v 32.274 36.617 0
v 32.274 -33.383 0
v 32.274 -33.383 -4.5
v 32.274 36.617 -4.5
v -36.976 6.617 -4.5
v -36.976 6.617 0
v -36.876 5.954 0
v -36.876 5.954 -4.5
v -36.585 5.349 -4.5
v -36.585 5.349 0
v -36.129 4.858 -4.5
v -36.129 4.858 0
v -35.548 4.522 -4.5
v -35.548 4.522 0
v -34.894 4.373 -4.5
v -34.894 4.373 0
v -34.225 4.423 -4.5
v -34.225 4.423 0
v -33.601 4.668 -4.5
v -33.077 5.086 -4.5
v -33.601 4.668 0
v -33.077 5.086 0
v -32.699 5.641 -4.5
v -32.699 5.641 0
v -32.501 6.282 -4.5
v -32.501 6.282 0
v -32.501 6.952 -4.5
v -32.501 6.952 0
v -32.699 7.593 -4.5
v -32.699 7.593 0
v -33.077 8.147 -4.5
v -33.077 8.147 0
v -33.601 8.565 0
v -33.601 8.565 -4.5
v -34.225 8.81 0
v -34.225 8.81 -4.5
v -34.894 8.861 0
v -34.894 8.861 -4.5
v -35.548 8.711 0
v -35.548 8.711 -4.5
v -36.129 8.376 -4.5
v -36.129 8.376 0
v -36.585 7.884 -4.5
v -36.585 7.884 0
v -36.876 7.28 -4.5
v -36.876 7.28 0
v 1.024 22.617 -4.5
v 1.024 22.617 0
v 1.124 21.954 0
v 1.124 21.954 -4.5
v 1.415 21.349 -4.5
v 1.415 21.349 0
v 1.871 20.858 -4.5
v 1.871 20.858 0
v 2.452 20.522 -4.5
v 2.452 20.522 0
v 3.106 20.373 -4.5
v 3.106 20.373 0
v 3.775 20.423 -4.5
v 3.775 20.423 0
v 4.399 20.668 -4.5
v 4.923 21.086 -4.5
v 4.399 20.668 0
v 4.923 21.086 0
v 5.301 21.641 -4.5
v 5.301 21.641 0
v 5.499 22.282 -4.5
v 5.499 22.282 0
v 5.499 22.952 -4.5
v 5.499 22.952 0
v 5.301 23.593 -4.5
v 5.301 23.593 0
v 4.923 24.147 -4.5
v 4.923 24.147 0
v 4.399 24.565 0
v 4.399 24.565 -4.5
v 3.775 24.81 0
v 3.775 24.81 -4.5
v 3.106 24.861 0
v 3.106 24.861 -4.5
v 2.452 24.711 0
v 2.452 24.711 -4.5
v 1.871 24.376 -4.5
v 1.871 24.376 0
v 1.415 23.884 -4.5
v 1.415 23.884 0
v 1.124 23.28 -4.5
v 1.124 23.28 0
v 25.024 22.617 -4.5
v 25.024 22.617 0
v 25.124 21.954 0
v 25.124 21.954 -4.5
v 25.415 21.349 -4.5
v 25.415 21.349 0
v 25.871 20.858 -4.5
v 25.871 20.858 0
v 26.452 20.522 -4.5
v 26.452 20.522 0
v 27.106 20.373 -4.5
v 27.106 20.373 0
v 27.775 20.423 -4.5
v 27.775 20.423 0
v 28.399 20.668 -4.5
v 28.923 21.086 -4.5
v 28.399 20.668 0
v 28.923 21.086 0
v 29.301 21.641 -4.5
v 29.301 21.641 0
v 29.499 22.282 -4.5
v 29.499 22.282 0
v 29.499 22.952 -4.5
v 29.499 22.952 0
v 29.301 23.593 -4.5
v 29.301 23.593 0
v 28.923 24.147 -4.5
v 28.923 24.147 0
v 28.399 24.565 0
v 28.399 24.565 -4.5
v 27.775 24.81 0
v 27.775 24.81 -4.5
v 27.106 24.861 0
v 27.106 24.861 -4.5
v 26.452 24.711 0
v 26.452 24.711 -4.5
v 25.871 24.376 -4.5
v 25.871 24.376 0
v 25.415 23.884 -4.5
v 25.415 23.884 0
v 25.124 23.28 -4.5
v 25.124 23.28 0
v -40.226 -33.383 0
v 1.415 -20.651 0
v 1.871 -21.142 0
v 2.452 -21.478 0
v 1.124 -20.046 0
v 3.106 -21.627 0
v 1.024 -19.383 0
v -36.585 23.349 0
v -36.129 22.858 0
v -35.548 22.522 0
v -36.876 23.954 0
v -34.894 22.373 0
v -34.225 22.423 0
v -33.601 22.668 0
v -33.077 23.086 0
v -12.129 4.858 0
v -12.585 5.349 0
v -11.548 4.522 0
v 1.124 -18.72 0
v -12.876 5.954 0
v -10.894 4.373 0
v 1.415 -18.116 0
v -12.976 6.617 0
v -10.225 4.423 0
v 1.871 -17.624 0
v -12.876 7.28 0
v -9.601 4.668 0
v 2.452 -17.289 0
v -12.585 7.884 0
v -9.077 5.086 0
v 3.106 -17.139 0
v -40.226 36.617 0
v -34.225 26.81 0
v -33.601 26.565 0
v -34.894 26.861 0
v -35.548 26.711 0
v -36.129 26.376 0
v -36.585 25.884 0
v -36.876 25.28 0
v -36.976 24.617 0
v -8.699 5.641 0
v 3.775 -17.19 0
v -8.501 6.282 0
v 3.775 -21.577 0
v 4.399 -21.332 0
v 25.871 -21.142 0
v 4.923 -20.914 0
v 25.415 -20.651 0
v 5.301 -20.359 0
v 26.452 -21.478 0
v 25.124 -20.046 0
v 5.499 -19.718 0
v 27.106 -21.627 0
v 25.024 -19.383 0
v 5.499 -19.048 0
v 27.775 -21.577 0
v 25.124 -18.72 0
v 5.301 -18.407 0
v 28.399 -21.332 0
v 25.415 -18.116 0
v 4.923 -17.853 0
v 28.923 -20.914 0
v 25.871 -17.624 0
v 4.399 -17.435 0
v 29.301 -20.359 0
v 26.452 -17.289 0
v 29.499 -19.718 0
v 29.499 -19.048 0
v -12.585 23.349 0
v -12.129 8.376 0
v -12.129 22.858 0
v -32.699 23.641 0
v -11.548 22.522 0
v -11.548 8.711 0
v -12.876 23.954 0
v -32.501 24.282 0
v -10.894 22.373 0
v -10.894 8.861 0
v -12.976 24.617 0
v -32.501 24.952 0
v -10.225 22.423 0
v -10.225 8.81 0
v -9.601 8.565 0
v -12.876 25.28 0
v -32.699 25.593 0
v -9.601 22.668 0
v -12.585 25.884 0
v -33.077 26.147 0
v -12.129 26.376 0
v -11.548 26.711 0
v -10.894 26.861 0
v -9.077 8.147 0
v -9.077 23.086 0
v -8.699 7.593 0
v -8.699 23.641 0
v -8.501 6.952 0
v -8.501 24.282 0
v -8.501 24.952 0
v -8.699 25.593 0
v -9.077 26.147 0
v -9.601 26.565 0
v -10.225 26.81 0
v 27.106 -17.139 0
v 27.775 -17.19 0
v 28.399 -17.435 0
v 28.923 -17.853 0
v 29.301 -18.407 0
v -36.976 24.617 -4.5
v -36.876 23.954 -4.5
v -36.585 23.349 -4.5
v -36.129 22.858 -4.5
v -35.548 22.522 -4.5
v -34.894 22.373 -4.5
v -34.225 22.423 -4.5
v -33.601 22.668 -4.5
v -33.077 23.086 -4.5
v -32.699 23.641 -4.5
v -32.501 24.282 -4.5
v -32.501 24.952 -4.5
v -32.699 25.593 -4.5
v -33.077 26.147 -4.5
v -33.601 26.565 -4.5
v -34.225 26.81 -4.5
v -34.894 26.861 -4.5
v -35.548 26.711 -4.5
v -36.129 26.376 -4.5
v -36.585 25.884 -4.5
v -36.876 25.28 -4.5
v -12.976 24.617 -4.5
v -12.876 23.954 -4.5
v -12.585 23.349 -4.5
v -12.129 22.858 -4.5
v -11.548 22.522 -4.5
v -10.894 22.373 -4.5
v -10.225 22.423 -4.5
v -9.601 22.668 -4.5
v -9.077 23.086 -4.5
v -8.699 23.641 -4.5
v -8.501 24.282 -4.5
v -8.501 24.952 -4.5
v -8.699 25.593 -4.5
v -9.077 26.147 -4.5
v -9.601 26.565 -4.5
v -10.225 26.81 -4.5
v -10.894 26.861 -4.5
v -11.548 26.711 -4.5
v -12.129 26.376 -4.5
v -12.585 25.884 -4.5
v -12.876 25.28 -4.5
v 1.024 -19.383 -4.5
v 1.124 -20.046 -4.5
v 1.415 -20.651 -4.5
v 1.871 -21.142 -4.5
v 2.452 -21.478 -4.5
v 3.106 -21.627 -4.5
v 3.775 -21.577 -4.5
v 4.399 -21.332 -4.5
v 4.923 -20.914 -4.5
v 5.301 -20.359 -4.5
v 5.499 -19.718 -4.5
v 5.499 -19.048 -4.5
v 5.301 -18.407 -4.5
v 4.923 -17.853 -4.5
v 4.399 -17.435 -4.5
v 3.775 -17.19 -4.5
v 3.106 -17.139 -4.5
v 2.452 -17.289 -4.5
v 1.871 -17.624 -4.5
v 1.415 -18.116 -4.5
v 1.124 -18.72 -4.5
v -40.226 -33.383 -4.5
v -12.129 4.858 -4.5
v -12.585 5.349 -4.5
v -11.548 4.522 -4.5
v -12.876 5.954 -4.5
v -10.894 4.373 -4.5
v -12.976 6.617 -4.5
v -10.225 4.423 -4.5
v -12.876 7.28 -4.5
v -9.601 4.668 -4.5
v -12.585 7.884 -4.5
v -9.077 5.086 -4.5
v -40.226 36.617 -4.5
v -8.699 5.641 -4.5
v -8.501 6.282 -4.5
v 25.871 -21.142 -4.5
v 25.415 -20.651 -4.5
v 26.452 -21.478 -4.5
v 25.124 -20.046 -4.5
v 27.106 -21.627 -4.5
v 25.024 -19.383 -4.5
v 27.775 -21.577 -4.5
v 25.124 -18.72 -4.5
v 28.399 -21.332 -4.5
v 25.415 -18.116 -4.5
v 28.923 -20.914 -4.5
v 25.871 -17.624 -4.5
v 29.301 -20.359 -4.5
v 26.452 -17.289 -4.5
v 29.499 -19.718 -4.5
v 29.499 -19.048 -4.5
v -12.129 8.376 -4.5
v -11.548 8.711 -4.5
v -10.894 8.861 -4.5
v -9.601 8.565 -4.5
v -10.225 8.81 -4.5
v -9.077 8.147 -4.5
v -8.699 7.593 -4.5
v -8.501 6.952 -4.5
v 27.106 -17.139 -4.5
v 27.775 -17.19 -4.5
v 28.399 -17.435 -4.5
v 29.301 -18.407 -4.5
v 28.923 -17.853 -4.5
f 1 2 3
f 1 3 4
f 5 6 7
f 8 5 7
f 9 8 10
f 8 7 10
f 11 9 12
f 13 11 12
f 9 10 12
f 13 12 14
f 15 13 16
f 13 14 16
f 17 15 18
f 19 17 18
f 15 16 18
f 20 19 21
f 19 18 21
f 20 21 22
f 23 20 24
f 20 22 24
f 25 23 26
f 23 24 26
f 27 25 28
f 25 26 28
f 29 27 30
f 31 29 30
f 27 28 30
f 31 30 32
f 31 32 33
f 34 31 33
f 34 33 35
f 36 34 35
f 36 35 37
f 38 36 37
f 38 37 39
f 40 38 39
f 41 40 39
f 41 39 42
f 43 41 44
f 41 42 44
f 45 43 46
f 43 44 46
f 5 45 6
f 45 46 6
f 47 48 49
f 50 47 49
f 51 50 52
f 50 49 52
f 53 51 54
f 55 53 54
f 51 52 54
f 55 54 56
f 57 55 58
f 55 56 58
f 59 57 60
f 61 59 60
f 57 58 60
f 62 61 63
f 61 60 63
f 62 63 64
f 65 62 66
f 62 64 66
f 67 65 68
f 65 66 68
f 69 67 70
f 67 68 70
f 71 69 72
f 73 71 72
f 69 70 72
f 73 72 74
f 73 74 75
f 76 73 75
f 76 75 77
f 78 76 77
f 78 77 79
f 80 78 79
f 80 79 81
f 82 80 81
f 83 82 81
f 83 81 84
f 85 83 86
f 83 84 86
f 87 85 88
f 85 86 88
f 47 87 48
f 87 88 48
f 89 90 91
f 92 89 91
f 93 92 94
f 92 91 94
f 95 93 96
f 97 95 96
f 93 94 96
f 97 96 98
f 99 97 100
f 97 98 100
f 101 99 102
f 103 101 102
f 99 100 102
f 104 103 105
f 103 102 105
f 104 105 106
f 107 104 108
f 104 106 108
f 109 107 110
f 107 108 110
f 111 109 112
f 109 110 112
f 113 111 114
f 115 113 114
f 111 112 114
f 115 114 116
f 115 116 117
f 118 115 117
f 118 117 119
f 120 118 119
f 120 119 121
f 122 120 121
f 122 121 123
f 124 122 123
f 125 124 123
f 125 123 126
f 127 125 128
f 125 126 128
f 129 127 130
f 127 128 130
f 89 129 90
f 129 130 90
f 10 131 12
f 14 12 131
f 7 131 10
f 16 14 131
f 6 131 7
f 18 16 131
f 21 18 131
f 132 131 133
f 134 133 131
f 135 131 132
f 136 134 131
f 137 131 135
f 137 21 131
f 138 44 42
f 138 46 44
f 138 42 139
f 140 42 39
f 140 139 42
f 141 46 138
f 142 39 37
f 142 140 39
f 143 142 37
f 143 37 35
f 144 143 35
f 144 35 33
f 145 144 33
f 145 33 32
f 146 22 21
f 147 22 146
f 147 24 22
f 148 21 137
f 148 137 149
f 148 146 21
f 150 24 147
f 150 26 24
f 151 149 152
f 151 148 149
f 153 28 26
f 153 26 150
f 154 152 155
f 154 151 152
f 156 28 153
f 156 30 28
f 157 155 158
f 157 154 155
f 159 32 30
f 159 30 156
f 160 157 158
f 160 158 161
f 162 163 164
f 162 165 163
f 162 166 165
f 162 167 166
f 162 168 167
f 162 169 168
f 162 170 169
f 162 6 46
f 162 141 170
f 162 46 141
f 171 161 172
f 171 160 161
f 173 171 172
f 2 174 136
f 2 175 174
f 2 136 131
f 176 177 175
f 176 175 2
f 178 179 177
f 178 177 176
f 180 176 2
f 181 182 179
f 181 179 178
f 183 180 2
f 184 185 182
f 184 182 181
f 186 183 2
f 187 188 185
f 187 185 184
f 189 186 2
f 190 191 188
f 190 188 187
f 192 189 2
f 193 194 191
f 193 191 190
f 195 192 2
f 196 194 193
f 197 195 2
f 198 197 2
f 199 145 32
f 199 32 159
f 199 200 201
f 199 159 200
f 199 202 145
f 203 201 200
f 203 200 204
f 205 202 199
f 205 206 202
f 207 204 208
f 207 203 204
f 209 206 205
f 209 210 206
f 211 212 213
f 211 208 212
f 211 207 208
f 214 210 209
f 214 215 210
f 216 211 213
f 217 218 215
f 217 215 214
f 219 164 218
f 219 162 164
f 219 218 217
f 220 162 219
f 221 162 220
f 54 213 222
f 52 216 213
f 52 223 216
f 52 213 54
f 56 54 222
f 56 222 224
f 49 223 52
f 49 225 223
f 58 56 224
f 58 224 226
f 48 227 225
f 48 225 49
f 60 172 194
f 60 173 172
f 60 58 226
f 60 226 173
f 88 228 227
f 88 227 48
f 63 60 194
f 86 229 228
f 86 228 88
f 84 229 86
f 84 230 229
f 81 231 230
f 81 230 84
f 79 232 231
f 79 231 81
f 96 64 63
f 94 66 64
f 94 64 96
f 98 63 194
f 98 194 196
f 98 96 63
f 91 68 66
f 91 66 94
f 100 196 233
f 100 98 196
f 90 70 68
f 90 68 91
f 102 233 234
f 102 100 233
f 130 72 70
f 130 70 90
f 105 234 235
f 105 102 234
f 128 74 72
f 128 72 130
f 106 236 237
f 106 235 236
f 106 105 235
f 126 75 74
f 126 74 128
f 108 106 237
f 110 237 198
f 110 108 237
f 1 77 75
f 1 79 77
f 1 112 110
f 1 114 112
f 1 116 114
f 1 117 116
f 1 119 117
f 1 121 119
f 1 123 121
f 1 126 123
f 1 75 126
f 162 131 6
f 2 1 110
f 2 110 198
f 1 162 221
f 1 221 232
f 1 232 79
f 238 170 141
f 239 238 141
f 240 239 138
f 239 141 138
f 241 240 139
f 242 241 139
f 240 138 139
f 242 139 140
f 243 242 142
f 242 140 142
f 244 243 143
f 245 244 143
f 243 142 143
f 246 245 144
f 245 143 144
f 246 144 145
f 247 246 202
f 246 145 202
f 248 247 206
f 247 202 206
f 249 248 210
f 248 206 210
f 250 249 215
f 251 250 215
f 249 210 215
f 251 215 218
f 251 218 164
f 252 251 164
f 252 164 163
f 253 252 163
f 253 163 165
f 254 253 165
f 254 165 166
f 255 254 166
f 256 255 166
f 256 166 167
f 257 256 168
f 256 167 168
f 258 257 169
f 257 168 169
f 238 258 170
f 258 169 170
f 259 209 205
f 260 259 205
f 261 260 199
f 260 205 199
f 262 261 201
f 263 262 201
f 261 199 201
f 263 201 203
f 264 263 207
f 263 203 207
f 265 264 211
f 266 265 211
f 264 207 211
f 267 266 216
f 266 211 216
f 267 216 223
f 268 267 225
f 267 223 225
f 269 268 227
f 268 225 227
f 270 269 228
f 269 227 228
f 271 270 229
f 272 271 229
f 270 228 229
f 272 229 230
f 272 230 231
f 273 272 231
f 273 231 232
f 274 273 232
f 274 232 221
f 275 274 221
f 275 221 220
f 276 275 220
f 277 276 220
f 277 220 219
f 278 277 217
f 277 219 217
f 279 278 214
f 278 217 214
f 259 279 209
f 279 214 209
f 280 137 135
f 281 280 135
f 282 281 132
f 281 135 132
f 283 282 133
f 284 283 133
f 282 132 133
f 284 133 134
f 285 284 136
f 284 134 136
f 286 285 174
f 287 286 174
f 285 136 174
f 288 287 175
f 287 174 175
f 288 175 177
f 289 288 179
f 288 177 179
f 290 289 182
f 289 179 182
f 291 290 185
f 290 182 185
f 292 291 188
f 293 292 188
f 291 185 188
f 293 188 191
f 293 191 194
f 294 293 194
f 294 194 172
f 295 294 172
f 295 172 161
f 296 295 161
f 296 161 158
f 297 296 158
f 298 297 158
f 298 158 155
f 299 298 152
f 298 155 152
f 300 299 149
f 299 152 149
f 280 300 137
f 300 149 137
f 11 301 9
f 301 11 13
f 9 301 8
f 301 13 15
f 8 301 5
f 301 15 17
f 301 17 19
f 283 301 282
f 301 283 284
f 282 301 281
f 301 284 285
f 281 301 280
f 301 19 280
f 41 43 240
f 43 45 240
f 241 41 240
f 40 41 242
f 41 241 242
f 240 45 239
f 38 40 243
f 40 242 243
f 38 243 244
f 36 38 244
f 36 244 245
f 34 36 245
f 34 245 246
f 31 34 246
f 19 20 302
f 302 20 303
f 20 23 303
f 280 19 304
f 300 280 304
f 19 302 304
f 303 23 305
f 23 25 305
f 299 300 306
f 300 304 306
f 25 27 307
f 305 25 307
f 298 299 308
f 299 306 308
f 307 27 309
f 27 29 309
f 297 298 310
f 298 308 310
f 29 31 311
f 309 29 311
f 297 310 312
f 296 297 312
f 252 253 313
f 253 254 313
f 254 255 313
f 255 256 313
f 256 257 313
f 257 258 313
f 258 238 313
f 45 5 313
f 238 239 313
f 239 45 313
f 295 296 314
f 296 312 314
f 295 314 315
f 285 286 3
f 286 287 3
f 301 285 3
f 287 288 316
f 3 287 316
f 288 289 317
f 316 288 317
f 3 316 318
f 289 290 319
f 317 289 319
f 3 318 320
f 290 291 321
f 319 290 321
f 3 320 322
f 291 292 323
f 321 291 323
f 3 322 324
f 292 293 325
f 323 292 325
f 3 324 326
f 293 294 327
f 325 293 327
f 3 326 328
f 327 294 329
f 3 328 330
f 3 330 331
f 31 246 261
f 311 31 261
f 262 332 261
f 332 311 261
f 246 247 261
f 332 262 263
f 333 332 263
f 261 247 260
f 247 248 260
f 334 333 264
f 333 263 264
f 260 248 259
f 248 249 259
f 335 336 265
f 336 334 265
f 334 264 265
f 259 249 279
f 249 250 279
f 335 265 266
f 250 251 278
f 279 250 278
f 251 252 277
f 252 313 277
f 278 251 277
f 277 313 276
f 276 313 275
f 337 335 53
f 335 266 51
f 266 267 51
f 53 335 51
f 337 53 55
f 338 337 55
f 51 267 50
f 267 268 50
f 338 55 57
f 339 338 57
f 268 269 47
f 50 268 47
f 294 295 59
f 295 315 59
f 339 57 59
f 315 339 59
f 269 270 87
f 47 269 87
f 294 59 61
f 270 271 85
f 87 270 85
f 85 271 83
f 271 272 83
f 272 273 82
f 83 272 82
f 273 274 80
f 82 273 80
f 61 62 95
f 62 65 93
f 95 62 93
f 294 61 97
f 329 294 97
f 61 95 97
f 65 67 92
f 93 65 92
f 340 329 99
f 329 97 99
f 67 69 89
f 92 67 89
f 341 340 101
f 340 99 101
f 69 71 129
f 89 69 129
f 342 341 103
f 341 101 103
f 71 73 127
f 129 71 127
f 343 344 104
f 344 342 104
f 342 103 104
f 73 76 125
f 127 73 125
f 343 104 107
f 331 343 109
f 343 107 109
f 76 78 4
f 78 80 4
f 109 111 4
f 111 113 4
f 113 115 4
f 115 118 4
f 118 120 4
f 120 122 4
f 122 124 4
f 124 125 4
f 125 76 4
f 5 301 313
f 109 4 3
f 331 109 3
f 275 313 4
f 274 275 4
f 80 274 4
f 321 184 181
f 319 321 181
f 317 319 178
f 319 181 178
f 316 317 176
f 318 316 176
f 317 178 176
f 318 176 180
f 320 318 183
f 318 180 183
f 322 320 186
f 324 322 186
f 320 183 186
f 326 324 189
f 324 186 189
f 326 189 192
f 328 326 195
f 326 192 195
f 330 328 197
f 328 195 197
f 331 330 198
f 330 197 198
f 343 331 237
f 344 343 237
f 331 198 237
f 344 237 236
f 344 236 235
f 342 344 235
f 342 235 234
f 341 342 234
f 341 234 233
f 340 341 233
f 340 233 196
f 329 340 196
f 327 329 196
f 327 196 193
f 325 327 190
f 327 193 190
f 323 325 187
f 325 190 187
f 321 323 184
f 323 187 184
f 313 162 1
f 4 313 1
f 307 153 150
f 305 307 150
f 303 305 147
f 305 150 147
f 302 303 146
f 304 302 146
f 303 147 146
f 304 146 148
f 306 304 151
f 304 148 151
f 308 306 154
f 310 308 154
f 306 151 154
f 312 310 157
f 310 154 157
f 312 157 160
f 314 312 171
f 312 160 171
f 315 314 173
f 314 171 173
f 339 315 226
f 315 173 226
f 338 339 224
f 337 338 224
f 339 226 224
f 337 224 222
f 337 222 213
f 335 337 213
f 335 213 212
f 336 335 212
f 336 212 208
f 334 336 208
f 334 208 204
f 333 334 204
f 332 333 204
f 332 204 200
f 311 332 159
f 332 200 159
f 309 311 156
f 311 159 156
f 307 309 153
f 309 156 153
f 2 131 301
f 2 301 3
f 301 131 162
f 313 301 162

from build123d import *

# Parameters (mm, degrees)
SKETCH1_W          = 72.5
SKETCH1_H          = 70
SKETCH1_R          = 2.25
BASE_FLANGE1_DEPTH = 4.5


# Sheet-metal steps are written as plain solids
with BuildPart() as part:
    # Sketch1 → Base-Flange1 (new body)
    with BuildSketch(Plane.XY):
        with Locations((-3.976149958, 1.616858374)):
            Rectangle(SKETCH1_W, SKETCH1_H)
        with Locations(Location((-34.726149958, 24.616858374, 0), (0, 0, 180))):
            Circle(SKETCH1_R, mode=Mode.SUBTRACT)
        with Locations(Location((-10.726149958, 24.616858374, 0), (0, 0, 180))):
            Circle(SKETCH1_R, mode=Mode.SUBTRACT)
        with Locations(Location((-10.726149958, 6.616858374, 0), (0, 0, 180))):
            Circle(SKETCH1_R, mode=Mode.SUBTRACT)
        with Locations(Location((-34.726149958, 6.616858374, 0), (0, 0, 180))):
            Circle(SKETCH1_R, mode=Mode.SUBTRACT)
        with Locations(Location((3.273850042, -19.383141626, 0), (0, 0, 180))):
            Circle(SKETCH1_R, mode=Mode.SUBTRACT)
        with Locations(Location((3.273850042, 22.616858374, 0), (0, 0, 180))):
            Circle(SKETCH1_R, mode=Mode.SUBTRACT)
        with Locations(Location((27.273850042, -19.383141626, 0), (0, 0, 180))):
            Circle(SKETCH1_R, mode=Mode.SUBTRACT)
        with Locations(Location((27.273850042, 22.616858374, 0), (0, 0, 180))):
            Circle(SKETCH1_R, mode=Mode.SUBTRACT)
    extrude(amount=-BASE_FLANGE1_DEPTH)


solid = part.part
